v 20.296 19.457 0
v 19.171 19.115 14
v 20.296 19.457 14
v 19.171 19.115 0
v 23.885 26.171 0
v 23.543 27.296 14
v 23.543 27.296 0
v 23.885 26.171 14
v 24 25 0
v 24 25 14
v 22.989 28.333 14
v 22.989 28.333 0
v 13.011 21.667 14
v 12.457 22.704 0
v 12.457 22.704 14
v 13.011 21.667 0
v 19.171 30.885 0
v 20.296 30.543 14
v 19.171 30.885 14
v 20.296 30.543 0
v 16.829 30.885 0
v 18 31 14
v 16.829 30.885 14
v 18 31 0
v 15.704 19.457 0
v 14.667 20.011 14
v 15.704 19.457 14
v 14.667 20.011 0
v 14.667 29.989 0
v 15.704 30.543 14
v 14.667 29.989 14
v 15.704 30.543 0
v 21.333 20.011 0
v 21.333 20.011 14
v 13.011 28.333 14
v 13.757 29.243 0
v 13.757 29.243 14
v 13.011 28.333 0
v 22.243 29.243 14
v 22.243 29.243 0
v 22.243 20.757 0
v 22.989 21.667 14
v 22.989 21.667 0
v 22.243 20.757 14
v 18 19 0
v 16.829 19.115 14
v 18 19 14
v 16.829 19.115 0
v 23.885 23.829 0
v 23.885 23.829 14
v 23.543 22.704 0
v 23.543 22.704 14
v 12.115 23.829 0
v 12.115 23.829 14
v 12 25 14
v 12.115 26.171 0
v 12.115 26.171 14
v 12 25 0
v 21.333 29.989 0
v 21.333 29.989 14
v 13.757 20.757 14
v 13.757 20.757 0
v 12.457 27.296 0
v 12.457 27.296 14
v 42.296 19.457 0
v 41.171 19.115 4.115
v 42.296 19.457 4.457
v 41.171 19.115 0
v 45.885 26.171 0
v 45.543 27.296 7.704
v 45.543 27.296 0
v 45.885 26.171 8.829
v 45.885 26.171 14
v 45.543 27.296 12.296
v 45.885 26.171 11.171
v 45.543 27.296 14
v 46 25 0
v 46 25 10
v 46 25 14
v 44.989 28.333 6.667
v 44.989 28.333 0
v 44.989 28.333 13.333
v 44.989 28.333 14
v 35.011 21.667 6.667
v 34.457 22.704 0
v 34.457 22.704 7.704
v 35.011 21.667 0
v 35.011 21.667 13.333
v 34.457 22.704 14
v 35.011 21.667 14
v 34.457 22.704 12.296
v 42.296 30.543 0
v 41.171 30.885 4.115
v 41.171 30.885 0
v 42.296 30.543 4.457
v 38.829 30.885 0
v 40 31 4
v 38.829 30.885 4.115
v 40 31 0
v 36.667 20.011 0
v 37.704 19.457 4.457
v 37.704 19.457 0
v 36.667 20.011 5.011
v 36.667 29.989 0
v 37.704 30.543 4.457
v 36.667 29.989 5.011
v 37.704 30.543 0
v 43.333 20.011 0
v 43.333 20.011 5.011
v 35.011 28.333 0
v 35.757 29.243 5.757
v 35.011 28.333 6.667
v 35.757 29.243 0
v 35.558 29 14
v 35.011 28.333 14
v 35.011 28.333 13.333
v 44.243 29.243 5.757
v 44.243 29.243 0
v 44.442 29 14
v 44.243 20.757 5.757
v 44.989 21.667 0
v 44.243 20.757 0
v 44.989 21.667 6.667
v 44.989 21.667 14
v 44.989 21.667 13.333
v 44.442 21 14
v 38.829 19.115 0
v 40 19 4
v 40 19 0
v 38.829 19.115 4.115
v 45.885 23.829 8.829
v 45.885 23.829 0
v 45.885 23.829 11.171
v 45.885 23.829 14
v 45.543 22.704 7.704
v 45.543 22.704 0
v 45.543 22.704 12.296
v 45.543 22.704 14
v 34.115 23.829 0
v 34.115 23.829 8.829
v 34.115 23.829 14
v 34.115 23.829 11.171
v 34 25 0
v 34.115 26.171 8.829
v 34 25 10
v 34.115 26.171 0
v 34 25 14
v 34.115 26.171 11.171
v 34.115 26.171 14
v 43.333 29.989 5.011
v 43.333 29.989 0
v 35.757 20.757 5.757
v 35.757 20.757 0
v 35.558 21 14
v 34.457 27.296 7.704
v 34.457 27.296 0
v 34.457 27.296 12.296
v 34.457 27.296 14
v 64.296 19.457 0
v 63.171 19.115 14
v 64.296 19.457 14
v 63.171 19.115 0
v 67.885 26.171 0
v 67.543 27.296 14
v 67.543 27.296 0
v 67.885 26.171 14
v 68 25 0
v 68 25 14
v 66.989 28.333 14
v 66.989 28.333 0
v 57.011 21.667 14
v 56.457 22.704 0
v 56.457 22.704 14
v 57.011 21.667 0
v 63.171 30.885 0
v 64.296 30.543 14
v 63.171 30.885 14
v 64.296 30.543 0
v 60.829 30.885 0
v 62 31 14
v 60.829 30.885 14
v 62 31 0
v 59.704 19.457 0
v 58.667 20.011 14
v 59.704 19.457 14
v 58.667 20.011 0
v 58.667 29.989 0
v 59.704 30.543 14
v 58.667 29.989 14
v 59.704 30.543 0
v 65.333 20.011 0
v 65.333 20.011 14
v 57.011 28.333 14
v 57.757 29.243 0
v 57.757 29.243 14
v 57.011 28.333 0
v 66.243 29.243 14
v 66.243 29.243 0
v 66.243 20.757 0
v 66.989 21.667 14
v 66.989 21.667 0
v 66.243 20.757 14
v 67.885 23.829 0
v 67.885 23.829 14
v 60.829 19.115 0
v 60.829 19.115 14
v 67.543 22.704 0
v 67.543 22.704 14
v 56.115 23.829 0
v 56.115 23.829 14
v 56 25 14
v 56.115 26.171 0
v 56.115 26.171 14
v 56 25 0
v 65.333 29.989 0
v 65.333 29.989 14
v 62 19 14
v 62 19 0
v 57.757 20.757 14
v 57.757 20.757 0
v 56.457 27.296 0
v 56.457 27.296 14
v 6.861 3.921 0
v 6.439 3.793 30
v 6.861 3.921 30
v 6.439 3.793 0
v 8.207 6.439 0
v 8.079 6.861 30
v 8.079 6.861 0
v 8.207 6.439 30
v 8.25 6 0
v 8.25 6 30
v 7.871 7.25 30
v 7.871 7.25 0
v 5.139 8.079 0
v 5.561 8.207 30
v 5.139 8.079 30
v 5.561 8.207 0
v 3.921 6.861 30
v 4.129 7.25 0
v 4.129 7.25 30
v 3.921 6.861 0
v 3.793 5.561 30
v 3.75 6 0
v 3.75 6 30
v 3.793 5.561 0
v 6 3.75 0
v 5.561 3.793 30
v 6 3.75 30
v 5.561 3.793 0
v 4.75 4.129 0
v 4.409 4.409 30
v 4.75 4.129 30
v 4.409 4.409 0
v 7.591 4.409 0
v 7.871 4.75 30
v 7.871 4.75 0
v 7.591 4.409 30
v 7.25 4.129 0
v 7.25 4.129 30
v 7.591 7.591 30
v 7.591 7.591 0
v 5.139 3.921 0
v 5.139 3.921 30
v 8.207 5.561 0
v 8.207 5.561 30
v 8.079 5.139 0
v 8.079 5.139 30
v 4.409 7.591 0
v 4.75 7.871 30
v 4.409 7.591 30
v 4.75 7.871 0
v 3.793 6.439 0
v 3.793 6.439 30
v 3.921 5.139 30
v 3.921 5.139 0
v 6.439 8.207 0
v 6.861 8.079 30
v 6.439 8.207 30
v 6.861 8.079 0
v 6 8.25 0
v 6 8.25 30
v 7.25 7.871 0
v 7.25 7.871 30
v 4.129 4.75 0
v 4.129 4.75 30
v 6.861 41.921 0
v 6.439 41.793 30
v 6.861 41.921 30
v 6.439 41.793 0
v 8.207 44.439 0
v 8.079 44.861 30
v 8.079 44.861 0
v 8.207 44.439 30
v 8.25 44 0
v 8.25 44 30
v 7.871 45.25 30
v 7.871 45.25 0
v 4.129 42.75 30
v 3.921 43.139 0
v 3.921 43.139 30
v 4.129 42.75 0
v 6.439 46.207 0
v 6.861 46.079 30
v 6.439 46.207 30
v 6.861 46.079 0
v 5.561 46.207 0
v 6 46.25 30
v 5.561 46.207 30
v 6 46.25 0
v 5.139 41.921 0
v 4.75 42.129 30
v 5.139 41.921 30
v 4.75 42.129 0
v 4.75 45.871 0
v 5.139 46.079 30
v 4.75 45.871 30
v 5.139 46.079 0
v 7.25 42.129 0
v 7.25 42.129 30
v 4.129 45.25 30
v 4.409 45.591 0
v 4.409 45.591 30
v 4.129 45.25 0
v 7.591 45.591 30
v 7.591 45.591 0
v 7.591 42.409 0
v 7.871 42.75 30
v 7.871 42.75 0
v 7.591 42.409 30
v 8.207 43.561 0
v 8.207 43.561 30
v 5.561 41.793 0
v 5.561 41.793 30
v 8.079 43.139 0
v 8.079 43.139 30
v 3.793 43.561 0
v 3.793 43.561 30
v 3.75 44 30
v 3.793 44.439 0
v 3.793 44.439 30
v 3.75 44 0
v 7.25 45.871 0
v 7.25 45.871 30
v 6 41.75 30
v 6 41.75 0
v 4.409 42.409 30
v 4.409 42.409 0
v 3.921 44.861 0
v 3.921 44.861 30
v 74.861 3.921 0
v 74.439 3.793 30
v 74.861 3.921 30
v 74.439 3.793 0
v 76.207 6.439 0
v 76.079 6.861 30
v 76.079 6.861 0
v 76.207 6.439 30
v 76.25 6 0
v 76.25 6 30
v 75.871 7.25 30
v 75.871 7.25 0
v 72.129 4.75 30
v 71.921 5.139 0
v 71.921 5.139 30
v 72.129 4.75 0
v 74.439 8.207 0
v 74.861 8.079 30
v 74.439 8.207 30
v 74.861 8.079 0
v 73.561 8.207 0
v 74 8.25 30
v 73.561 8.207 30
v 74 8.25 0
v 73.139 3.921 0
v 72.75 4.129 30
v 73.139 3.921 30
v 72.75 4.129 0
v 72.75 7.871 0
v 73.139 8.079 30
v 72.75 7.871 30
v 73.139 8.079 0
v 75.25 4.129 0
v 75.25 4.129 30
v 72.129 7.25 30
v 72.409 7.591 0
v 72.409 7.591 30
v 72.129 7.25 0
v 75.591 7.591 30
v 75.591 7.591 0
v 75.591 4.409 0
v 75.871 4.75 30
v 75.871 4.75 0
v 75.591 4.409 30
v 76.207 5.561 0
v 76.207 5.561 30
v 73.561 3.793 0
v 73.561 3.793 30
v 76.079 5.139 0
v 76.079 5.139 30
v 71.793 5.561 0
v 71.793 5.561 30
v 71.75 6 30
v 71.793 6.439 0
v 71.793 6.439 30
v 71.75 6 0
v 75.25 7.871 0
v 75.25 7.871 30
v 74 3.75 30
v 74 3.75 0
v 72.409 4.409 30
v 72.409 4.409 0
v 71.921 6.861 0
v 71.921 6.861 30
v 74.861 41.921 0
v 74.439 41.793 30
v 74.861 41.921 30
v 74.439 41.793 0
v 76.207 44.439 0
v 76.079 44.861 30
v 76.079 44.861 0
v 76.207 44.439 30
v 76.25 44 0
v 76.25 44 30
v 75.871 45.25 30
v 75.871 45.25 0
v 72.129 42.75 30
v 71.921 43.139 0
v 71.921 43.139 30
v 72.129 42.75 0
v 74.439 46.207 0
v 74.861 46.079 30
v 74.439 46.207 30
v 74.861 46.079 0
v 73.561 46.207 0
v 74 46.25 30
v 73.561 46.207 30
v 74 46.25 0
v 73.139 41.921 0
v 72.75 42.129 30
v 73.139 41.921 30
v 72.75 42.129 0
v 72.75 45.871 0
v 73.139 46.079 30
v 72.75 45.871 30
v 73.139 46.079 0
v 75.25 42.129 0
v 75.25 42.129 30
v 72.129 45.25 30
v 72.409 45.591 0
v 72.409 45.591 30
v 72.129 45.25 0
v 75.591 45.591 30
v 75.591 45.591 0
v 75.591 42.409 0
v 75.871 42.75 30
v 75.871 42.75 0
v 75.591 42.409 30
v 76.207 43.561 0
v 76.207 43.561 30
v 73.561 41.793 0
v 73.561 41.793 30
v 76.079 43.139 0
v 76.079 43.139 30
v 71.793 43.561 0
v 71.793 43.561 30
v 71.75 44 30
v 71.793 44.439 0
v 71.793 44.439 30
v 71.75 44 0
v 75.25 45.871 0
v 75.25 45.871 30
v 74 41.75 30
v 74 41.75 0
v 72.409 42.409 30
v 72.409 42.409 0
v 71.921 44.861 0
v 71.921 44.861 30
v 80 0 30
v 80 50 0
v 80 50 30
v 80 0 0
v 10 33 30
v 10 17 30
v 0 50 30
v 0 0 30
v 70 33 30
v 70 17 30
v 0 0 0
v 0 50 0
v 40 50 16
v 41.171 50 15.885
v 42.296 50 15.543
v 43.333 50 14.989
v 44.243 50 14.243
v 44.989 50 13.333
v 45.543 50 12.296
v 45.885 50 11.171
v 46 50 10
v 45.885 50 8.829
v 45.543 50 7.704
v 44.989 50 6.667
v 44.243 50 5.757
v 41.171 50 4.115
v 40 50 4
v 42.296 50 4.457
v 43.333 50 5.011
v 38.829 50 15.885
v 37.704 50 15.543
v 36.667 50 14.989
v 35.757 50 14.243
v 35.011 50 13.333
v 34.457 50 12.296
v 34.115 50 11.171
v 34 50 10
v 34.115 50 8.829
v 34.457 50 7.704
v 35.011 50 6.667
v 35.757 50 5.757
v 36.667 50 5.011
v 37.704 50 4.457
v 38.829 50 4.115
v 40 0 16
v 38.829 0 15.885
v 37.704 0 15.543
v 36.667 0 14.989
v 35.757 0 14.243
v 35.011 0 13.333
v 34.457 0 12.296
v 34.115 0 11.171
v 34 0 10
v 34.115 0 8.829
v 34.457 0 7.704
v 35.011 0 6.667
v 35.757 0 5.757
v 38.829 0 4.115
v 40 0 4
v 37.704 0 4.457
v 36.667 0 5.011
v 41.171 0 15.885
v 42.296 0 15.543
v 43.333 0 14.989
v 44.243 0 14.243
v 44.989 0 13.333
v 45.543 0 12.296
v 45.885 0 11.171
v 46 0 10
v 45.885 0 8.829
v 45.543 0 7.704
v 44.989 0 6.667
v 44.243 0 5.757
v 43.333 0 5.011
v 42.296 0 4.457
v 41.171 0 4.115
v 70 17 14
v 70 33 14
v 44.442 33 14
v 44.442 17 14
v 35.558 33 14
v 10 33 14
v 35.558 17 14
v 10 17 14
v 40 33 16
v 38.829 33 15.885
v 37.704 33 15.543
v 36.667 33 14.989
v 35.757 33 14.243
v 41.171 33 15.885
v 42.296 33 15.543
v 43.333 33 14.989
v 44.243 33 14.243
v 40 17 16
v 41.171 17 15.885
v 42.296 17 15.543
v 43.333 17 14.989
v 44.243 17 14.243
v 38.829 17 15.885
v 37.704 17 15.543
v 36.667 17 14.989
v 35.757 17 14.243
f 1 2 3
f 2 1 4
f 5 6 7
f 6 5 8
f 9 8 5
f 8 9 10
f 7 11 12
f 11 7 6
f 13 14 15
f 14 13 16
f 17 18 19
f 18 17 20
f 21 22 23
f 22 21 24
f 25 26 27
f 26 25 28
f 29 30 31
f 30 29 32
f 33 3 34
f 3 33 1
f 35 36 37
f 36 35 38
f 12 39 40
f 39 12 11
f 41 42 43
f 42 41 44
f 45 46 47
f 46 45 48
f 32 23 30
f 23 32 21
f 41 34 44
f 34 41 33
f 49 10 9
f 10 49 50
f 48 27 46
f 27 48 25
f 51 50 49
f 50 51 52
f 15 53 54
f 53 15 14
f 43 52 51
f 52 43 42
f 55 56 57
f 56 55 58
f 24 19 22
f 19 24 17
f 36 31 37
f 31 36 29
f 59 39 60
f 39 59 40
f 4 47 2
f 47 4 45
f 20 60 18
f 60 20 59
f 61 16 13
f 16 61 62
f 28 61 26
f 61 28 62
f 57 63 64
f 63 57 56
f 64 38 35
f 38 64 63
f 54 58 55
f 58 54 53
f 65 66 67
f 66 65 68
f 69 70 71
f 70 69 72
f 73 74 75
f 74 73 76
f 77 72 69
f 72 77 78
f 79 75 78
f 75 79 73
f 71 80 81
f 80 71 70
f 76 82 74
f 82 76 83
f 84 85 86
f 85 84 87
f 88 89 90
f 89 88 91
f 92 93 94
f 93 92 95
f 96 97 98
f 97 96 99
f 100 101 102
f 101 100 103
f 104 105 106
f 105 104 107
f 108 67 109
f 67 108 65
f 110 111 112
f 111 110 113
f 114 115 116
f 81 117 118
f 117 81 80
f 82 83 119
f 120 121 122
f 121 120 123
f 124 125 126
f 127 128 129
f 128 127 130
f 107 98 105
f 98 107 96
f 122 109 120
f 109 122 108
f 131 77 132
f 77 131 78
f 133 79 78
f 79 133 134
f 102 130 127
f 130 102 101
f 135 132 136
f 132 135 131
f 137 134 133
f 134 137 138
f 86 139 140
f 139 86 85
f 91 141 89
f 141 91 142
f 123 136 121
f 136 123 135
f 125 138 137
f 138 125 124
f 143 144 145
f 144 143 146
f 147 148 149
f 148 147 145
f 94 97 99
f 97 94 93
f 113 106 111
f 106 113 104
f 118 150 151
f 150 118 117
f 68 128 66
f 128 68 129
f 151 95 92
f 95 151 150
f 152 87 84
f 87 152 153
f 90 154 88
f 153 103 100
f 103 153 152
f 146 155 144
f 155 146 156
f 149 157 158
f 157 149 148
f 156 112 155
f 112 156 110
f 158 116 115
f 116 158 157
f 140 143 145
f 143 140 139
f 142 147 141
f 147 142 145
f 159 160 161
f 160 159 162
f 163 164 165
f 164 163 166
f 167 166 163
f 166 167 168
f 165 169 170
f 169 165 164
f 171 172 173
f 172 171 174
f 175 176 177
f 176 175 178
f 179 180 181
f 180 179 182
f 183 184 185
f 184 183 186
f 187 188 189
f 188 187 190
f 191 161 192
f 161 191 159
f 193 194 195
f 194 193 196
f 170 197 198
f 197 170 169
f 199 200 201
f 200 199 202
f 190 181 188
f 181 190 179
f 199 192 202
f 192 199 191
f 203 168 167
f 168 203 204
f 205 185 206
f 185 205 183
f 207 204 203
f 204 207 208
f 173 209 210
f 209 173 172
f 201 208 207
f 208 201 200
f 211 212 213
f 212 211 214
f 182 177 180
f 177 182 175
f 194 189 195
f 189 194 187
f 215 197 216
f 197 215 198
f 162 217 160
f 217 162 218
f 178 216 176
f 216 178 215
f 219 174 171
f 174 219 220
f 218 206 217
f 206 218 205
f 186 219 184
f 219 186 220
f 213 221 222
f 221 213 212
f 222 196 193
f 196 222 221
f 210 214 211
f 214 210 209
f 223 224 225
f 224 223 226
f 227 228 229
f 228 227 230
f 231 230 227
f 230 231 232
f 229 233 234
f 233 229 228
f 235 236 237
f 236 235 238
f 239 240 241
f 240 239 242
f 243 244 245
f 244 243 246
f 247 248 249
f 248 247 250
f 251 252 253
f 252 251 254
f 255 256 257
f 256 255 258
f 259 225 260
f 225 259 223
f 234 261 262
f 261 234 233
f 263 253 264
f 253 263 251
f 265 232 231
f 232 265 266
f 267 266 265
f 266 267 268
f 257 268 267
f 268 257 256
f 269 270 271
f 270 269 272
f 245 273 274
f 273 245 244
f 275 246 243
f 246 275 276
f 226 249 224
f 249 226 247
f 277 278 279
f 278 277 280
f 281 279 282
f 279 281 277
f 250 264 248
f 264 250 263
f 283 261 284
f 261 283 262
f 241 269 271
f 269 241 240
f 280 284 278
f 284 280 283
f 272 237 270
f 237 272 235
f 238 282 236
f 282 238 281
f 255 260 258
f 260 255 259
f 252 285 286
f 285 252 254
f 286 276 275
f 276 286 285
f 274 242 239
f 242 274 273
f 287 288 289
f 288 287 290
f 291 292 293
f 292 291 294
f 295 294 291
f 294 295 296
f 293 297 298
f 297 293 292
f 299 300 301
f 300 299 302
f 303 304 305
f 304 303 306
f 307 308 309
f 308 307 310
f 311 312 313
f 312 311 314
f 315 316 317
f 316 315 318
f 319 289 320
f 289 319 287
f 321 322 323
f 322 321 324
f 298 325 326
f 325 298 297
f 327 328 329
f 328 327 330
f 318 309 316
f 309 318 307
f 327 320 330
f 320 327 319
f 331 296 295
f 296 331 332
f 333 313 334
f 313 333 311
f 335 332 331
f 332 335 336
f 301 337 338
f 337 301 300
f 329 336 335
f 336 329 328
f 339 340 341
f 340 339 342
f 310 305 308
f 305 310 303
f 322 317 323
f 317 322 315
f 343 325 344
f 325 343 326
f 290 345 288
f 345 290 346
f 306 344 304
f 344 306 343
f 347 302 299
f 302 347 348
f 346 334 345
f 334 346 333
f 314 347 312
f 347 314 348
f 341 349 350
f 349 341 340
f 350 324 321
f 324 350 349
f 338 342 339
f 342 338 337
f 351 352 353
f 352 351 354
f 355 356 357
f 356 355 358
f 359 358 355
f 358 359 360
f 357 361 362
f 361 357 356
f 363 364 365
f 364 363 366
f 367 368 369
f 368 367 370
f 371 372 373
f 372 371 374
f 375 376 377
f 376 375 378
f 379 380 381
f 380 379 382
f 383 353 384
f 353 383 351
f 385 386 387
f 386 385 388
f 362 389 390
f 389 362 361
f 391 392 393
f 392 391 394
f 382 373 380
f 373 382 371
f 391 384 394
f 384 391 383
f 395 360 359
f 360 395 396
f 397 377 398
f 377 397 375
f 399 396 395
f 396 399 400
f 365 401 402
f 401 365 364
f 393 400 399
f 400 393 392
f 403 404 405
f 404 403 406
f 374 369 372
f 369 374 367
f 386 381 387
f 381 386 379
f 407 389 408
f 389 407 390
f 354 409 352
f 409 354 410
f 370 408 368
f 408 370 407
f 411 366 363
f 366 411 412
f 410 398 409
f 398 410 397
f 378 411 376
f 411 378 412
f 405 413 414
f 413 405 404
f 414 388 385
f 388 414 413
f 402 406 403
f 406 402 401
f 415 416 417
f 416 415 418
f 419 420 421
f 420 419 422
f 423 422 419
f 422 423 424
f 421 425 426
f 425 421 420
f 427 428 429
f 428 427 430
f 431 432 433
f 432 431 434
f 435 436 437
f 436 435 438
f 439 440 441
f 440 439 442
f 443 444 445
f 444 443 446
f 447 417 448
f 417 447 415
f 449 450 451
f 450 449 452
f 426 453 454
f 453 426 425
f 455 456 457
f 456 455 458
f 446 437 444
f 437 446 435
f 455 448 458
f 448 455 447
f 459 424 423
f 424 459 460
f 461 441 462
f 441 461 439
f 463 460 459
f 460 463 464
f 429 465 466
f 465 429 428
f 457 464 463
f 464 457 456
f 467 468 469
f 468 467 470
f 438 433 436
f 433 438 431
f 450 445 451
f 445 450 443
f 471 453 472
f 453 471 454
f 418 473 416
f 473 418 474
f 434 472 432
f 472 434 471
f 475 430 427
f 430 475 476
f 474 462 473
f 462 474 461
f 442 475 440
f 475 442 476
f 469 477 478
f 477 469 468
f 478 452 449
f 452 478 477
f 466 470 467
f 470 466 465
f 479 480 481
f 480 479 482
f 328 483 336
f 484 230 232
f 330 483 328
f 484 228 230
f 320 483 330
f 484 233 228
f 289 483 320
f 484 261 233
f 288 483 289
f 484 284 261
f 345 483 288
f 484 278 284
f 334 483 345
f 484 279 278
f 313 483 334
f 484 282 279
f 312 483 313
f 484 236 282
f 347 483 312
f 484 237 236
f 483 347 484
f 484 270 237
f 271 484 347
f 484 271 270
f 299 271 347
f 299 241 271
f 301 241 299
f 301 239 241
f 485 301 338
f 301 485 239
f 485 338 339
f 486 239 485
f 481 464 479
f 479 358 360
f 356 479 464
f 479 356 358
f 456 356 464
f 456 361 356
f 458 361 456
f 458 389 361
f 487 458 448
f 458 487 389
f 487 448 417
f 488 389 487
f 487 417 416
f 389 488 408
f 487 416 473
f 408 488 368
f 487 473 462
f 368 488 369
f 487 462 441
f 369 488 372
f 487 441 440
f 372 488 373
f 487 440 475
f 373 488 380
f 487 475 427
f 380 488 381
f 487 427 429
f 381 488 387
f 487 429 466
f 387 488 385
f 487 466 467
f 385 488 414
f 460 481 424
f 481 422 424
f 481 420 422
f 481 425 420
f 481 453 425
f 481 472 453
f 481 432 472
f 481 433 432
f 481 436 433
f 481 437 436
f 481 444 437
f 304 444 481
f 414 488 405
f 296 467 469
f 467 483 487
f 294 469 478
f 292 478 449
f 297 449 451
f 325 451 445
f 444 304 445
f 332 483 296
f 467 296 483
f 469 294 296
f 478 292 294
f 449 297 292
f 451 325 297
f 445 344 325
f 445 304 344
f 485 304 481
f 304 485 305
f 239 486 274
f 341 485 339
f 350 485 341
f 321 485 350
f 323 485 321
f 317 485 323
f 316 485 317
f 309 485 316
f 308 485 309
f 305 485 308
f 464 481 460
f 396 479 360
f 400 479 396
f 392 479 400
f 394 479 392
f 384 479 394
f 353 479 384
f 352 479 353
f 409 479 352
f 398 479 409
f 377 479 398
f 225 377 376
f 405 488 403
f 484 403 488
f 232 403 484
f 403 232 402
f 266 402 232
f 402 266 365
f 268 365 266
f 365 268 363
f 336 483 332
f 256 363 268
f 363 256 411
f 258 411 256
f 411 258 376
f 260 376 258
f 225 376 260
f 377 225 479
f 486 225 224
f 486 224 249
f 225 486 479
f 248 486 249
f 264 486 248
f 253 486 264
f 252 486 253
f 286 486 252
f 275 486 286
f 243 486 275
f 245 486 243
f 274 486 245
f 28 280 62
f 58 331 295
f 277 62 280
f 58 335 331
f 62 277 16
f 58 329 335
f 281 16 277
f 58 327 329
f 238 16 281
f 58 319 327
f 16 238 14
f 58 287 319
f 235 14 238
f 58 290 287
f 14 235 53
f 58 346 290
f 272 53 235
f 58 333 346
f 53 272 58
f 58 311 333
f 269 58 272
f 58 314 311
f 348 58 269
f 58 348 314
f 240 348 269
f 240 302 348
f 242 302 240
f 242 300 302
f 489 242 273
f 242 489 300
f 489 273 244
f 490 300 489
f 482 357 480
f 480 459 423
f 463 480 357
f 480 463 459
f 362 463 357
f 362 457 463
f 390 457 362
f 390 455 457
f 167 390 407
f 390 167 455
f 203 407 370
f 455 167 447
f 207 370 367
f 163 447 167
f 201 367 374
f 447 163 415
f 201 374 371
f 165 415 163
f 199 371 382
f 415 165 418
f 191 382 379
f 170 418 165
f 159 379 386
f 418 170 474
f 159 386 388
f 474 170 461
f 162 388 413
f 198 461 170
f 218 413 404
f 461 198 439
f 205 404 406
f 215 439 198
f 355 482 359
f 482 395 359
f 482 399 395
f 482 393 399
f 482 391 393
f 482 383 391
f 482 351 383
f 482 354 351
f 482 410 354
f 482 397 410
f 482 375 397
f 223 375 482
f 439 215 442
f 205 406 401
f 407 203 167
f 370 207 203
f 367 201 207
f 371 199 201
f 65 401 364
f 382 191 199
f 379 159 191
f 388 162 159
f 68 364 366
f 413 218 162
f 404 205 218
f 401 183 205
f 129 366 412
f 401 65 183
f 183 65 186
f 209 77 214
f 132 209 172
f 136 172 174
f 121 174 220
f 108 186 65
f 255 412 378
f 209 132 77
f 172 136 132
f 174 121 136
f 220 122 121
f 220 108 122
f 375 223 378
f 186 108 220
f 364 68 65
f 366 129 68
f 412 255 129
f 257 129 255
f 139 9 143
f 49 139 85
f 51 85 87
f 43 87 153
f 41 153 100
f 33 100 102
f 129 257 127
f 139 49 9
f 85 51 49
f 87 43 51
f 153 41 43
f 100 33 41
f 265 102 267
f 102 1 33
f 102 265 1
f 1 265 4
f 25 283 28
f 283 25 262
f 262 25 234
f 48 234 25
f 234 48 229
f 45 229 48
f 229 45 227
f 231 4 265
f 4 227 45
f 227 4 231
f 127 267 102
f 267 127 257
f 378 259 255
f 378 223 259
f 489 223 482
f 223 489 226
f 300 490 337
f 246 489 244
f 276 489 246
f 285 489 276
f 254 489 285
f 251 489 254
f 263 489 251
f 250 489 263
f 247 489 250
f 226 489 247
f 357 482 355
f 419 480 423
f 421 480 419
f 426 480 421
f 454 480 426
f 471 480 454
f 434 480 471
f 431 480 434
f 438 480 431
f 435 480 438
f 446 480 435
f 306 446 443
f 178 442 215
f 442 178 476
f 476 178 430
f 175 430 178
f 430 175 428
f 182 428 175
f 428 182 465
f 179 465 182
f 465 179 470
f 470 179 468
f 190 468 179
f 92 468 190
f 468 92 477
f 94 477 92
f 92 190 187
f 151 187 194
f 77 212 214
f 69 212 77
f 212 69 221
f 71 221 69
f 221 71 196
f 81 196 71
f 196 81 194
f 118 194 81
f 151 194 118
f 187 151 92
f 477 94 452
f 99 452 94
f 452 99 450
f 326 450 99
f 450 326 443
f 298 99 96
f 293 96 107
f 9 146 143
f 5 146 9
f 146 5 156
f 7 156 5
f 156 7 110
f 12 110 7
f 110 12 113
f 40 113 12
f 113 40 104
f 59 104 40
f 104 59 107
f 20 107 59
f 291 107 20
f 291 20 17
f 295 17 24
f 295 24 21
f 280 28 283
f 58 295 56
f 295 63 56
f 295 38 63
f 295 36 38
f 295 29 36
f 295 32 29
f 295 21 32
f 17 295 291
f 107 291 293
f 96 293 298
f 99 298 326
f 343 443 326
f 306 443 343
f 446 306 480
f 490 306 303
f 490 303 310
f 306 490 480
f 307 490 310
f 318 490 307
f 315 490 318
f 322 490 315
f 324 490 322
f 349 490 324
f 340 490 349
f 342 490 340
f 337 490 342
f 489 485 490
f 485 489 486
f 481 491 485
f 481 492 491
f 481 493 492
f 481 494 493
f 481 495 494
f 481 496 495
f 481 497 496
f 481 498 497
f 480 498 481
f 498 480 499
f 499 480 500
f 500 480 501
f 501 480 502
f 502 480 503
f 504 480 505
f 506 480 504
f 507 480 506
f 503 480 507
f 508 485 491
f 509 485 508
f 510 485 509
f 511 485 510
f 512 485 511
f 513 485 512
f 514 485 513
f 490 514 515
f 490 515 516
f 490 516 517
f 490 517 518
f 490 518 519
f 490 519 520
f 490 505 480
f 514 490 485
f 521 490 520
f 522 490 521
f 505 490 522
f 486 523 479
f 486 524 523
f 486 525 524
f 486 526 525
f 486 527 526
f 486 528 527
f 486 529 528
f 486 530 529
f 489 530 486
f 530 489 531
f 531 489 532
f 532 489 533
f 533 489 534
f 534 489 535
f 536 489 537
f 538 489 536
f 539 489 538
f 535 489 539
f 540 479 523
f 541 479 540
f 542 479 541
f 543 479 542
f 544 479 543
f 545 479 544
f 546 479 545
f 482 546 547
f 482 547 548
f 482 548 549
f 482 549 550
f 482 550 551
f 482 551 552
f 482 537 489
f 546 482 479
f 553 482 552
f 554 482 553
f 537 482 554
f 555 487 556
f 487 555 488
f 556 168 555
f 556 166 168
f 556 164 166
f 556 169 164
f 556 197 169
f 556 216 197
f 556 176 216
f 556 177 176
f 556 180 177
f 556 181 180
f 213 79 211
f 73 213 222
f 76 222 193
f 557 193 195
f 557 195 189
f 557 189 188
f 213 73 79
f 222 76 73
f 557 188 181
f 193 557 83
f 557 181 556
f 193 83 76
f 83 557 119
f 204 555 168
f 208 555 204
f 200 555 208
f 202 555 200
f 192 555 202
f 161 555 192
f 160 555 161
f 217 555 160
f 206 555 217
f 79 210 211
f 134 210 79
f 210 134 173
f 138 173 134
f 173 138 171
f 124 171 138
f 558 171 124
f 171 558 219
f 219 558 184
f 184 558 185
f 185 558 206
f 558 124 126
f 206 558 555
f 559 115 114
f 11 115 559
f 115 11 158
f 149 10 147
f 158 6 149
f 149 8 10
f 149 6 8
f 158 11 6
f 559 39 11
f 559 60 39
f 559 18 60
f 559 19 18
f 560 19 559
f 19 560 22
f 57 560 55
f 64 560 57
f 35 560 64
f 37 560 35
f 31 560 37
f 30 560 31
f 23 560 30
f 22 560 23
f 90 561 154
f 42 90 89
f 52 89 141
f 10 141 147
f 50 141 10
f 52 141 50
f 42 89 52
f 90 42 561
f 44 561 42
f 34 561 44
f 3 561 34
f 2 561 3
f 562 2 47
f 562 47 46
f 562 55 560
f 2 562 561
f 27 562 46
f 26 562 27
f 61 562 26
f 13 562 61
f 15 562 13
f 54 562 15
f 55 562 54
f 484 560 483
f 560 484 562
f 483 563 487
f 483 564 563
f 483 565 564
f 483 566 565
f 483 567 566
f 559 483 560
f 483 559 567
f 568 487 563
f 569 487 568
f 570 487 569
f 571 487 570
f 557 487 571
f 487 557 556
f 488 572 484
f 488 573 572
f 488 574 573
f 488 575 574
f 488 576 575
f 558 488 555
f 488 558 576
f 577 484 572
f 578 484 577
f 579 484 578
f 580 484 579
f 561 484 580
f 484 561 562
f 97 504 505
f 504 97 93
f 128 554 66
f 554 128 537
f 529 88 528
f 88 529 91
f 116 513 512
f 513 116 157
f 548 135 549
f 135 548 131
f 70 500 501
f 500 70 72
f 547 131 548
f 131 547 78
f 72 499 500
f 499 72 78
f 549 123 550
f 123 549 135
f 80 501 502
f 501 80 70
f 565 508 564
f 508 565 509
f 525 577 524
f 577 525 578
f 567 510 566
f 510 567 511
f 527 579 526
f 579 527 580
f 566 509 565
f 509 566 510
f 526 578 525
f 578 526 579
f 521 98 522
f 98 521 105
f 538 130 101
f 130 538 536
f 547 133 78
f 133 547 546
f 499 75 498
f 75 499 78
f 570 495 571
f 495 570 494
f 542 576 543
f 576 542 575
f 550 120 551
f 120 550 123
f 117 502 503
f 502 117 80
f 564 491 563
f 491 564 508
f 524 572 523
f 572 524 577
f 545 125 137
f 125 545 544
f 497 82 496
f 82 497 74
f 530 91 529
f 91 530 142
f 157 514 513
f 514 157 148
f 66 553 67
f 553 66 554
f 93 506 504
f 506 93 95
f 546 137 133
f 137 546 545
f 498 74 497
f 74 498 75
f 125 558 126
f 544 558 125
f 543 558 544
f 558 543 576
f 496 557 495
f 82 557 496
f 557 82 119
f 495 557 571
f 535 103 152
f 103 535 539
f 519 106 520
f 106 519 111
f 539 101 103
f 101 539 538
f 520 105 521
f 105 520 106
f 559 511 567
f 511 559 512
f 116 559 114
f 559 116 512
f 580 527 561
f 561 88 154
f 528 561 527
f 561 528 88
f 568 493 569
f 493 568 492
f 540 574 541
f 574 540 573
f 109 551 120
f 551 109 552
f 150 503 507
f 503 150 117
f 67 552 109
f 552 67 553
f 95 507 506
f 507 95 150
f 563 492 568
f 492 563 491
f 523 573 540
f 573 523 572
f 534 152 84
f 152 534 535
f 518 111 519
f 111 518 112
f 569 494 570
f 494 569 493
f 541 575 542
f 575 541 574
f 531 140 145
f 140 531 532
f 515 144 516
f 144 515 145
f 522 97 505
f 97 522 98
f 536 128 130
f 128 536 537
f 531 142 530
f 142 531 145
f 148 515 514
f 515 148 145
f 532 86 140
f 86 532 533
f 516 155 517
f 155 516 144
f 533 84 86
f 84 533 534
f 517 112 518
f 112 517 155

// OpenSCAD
$fn = 32;

// ----------------------------------------------------------------------
// Manifold block: side_outlet manifold
// ----------------------------------------------------------------------

// --- parameters (mm) ---
block_l = 80;             // block length, X
block_w = 50;             // block width, Y
block_h = 30;             // block height, Z
port_d = 12;              // port bore diameter
port_pitch = 22;          // port pitch along X
gallery_d = 16;           // top gallery width, Y
gallery_depth = 16;       // gallery pocket depth
wall_p = 10;              // gallery end wall thickness, X
mnt_d = 4.5;              // mounting hole diameter
mnt_in = 6;               // mounting hole inset from the edges
out_d = 12;               // outlet bore diameter
out_z = 10;               // outlet axis height

n_ports = 3;  // ports in the row
port_x0 = (block_l - (n_ports - 1) * port_pitch) / 2;  // first port X

difference() {
  cube([block_l, block_w, block_h]);
  for (i = [0 : n_ports - 1])
    translate([port_x0 + i * port_pitch, block_w / 2, -1])
      cylinder(h = block_h + 2, d = port_d);
  translate([wall_p, block_w / 2 - gallery_d / 2, block_h - gallery_depth])
    cube([block_l - 2 * wall_p, gallery_d, gallery_depth + 1]);
  for (cx = [mnt_in, block_l - mnt_in])
    for (cy = [mnt_in, block_w - mnt_in])
      translate([cx, cy, -1]) cylinder(h = block_h + 2, d = mnt_d);
  translate([block_l / 2, -1, out_z]) rotate([-90, 0, 0])
    cylinder(h = block_w + 2, d = out_d);
}
